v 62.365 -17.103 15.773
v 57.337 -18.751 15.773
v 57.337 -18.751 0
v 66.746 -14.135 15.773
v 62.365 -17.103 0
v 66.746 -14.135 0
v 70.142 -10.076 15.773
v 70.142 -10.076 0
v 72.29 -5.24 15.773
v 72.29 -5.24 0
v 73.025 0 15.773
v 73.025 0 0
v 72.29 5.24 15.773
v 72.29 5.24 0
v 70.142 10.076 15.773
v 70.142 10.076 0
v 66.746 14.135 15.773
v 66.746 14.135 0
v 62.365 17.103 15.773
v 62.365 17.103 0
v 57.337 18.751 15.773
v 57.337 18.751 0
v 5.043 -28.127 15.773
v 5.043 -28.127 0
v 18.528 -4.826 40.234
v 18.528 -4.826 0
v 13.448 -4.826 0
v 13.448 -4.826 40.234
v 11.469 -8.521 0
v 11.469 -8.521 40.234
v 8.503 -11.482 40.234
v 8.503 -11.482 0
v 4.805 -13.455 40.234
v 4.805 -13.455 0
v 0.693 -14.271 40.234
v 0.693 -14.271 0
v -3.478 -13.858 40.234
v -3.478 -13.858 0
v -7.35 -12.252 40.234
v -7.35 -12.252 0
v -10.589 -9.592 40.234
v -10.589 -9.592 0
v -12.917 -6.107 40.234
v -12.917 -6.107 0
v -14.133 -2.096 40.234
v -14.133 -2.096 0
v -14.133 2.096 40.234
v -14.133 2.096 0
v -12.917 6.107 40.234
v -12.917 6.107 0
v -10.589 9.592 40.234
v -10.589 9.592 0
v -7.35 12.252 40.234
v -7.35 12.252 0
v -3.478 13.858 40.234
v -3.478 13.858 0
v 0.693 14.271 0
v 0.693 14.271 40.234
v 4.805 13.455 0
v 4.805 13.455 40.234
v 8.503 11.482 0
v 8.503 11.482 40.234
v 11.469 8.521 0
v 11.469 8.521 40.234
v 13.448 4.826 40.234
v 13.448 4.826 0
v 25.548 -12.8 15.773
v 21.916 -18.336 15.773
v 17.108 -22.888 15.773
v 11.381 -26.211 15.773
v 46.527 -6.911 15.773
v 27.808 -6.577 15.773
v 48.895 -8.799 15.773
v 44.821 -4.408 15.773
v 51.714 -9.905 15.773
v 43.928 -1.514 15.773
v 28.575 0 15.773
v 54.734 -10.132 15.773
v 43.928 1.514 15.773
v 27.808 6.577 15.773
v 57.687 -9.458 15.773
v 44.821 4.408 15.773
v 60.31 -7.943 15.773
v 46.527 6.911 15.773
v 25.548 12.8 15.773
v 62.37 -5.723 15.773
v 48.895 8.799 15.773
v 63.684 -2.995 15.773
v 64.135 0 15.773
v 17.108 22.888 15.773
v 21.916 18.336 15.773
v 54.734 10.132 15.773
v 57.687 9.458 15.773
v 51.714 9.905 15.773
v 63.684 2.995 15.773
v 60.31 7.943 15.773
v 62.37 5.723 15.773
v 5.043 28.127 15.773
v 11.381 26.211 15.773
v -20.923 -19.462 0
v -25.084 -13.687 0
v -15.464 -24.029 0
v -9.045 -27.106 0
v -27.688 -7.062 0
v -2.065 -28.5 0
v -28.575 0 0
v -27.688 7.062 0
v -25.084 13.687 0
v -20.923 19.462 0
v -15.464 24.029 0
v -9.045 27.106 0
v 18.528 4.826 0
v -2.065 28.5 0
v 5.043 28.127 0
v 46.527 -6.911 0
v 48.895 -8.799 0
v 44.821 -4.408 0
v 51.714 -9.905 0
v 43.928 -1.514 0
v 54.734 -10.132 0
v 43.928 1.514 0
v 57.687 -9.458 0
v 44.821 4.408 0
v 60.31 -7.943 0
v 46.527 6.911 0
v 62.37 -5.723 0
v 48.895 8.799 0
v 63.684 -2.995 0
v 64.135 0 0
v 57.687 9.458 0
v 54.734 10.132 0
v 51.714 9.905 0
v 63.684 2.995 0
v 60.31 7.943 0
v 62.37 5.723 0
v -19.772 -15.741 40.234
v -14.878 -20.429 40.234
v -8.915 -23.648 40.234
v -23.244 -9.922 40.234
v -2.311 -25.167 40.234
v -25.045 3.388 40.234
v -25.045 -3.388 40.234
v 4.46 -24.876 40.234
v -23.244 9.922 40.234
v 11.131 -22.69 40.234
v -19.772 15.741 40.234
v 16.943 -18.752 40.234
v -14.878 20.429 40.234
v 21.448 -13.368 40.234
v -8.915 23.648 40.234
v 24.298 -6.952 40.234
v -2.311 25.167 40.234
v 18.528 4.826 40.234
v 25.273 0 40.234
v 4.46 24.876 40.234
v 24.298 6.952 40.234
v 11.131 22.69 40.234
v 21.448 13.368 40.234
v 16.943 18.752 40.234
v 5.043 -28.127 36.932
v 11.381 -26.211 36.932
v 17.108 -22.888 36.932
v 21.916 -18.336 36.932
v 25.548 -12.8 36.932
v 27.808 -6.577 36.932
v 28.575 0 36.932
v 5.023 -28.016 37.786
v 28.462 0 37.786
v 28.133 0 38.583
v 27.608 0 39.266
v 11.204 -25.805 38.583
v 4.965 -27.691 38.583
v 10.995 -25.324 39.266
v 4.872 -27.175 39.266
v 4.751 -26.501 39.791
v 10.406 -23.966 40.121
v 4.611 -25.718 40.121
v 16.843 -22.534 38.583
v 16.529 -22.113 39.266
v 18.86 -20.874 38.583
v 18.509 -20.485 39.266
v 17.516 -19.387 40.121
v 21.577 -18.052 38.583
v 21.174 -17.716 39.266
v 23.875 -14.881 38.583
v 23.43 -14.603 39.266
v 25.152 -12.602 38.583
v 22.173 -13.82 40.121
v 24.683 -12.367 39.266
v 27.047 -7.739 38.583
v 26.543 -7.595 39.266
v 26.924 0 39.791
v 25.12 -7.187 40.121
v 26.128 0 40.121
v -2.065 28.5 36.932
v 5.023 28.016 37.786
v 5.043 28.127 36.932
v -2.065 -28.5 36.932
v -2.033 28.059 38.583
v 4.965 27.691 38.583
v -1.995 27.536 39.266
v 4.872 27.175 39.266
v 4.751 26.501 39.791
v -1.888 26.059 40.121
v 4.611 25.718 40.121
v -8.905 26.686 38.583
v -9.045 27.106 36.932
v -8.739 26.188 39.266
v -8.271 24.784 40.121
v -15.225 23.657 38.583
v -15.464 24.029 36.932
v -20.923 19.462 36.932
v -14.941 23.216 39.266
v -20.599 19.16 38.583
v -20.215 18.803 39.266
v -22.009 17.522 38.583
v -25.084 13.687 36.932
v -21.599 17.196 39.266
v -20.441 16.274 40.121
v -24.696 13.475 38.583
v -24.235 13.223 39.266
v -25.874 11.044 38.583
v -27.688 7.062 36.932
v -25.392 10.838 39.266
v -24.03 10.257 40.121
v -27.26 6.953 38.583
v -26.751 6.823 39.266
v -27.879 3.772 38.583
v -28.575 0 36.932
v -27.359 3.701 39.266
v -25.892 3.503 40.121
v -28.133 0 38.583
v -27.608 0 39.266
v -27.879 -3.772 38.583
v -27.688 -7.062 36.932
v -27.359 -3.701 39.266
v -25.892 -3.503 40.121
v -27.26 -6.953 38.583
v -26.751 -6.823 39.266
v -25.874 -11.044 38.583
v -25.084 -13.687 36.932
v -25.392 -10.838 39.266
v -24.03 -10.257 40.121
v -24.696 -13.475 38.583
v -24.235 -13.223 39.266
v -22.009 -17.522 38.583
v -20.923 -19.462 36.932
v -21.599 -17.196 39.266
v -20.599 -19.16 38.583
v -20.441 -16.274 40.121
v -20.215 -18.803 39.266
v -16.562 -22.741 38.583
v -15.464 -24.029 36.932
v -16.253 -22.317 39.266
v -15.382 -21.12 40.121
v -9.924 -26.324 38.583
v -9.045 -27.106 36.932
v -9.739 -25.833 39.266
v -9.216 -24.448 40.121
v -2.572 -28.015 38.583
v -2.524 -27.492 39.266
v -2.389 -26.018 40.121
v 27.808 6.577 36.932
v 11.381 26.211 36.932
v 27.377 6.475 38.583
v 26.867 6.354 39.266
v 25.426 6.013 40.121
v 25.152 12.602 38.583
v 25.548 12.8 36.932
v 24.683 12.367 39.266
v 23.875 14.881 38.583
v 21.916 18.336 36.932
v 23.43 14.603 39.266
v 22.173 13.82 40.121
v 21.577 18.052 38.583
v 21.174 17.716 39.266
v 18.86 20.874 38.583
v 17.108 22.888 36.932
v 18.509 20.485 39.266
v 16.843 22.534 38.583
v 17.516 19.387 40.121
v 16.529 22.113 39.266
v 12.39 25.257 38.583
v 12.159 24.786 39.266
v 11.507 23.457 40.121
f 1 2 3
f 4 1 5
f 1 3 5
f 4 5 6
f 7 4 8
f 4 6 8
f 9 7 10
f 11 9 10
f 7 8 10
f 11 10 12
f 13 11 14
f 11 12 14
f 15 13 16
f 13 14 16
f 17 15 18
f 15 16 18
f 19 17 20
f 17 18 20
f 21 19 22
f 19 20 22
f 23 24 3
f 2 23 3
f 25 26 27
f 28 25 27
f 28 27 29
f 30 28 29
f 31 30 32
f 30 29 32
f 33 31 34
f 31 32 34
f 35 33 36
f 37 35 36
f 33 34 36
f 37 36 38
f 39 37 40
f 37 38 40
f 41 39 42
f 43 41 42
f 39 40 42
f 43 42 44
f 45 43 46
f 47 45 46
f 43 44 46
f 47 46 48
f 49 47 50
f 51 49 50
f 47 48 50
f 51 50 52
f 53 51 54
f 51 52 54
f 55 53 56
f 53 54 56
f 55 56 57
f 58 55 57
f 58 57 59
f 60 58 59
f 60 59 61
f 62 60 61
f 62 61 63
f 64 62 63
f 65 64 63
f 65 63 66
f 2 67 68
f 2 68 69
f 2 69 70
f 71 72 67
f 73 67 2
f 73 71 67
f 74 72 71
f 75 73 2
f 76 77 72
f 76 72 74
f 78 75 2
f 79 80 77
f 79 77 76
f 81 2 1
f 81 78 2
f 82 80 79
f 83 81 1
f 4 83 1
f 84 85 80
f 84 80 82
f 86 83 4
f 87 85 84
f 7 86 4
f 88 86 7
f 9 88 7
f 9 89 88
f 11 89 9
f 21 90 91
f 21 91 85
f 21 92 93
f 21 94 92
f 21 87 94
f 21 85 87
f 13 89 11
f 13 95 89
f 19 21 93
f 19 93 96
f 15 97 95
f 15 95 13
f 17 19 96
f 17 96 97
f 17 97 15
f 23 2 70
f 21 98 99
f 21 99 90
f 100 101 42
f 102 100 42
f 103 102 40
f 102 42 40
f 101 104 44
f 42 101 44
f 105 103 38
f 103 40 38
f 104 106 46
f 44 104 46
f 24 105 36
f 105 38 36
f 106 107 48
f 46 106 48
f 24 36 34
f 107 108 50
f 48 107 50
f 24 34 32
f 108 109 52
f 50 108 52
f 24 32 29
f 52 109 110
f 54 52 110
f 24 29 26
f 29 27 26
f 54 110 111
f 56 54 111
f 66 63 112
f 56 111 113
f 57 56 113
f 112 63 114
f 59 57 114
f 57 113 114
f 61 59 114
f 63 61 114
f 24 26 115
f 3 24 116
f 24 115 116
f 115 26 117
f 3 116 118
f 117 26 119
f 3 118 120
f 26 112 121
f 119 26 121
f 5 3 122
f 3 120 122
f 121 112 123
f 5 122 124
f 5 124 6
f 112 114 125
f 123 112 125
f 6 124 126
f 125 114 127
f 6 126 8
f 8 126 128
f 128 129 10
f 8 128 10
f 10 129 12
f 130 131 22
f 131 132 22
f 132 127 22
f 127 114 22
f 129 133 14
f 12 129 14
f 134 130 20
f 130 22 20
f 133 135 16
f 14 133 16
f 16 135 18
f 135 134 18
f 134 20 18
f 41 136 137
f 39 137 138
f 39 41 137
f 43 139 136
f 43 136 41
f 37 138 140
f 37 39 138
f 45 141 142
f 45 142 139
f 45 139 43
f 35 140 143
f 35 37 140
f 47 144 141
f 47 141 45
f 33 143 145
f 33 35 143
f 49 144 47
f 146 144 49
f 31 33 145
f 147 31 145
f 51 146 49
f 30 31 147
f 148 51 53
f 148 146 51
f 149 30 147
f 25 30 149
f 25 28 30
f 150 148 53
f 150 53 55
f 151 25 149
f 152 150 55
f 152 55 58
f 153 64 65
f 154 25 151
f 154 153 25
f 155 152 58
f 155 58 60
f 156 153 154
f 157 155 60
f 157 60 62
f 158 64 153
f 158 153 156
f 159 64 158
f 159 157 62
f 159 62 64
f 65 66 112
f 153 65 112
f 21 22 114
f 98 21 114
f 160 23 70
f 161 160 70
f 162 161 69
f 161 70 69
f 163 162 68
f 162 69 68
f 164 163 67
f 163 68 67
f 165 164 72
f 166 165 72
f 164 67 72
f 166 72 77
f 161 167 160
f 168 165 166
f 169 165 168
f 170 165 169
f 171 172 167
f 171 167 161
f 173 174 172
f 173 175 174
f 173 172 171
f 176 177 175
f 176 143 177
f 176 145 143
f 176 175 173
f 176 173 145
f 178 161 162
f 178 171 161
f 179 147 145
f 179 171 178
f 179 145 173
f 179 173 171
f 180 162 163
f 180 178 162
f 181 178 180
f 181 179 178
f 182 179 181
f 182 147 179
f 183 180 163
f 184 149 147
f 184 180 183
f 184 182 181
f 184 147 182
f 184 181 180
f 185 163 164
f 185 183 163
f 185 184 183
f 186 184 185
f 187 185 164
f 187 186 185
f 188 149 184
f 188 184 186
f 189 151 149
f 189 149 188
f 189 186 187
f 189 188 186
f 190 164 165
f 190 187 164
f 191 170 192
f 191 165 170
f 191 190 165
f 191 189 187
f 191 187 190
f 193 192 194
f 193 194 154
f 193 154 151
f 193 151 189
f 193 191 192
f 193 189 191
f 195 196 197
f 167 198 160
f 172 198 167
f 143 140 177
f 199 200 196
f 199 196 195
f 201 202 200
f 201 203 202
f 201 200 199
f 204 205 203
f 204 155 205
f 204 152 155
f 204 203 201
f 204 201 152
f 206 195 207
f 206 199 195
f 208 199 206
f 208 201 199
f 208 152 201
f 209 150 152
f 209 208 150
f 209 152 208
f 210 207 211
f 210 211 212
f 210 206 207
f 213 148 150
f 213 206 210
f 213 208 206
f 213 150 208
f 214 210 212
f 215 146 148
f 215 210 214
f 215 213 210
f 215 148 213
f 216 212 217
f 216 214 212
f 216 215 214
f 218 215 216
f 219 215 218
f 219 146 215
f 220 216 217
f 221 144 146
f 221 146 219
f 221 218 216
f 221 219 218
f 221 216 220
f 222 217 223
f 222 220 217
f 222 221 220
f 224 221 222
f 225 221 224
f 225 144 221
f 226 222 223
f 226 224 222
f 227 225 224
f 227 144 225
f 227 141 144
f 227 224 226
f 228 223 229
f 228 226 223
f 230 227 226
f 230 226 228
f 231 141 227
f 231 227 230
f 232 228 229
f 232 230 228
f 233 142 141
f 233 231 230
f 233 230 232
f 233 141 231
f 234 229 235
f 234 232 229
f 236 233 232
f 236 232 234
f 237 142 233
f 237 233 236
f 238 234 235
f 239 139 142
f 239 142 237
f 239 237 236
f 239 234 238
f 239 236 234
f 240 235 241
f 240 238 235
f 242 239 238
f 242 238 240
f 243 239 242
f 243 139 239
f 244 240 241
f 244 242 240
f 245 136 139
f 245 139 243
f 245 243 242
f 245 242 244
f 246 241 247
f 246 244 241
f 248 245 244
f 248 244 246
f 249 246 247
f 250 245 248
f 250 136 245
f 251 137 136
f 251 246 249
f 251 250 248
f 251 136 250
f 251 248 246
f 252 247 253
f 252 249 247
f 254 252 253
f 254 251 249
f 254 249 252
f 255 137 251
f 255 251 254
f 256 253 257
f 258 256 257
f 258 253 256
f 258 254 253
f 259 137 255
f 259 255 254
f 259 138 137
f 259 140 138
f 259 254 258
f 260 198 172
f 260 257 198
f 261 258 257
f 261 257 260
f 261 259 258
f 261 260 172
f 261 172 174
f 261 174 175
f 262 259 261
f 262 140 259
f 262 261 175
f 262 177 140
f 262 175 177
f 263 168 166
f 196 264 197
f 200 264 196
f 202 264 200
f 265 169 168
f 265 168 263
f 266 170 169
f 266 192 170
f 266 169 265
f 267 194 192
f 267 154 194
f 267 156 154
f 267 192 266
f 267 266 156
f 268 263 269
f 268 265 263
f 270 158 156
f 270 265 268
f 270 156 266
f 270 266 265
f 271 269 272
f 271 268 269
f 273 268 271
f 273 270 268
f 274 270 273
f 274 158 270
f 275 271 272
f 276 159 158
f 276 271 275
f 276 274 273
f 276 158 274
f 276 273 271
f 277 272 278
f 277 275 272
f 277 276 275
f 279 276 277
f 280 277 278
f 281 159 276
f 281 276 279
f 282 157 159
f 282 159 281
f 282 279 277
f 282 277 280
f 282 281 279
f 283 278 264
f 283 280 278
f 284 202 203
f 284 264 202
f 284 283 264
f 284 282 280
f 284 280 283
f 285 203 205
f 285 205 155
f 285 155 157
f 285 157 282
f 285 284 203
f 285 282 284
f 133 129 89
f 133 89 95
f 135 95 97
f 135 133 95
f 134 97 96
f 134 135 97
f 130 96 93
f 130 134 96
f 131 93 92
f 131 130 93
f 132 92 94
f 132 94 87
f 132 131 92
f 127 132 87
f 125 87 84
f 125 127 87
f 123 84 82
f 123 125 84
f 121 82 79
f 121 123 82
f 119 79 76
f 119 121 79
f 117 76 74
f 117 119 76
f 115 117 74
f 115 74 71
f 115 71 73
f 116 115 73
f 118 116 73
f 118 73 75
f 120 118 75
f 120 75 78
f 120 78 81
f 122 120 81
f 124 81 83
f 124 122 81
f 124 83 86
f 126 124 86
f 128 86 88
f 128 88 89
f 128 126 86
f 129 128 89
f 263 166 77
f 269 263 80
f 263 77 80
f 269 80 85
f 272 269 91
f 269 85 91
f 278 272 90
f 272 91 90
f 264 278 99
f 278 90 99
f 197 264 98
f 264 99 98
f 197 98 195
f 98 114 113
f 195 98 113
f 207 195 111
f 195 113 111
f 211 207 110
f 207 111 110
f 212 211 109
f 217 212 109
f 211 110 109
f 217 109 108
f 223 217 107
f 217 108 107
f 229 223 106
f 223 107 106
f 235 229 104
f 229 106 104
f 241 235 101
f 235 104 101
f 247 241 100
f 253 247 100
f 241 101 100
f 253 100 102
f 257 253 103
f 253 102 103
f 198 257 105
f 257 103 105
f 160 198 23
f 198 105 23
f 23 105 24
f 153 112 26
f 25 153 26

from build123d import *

# Parameters (mm, degrees)
F0_R     = 10.16
F1_DEPTH = 15.7734
F2_DEPTH = 40.2336
F3_R     = 3.302


with BuildPart() as f1:
    # F0 (on Top) → F1 (new body)
    with BuildSketch(Plane.XY):
        with BuildLine():
            Line((5.042647, -28.126541), (57.336765, -18.751028))
            ThreePointArc((57.336765, -18.751028), (73.025, 0), (57.336765, 18.751028))
            Line((57.336765, 18.751028), (5.042647, 28.126541))
            ThreePointArc((5.042647, 28.126541), (21.916025, 18.336262), (28.575, 0))
            ThreePointArc((28.575, 0), (21.916025, -18.336262), (5.042647, -28.126541))
        make_face()
        with Locations((53.975, 0)):
            Circle(F0_R, mode=Mode.SUBTRACT)
    extrude(amount=F1_DEPTH)

    # F0 (on Top) → F2 (join)
    with BuildSketch(Plane.XY):
        with BuildLine():
            ThreePointArc((5.042647, 28.126541), (-28.575, 0), (5.042647, -28.126541))
            ThreePointArc((5.042647, -28.126541), (21.916025, -18.336262), (28.575, 0))
            ThreePointArc((28.575, 0), (21.916025, 18.336262), (5.042647, 28.126541))
        make_face()
        with BuildLine():
            ThreePointArc((13.447765, -4.826), (-14.2875, 0), (13.447765, 4.826))
            Line((13.447765, 4.826), (18.527765, 4.826))
            Line((18.527765, 4.826), (18.527765, -4.826))
            Line((18.527765, -4.826), (13.447765, -4.826))
        make_face(mode=Mode.SUBTRACT)
    extrude(amount=F2_DEPTH)

    # F3
    f3_edges = [f1.edges().sort_by_distance(p)[0] for p in [
        (-5.042647, 28.126541, 40.2336),
    ]]
    fillet(f3_edges, radius=F3_R)


solid = f1.part
